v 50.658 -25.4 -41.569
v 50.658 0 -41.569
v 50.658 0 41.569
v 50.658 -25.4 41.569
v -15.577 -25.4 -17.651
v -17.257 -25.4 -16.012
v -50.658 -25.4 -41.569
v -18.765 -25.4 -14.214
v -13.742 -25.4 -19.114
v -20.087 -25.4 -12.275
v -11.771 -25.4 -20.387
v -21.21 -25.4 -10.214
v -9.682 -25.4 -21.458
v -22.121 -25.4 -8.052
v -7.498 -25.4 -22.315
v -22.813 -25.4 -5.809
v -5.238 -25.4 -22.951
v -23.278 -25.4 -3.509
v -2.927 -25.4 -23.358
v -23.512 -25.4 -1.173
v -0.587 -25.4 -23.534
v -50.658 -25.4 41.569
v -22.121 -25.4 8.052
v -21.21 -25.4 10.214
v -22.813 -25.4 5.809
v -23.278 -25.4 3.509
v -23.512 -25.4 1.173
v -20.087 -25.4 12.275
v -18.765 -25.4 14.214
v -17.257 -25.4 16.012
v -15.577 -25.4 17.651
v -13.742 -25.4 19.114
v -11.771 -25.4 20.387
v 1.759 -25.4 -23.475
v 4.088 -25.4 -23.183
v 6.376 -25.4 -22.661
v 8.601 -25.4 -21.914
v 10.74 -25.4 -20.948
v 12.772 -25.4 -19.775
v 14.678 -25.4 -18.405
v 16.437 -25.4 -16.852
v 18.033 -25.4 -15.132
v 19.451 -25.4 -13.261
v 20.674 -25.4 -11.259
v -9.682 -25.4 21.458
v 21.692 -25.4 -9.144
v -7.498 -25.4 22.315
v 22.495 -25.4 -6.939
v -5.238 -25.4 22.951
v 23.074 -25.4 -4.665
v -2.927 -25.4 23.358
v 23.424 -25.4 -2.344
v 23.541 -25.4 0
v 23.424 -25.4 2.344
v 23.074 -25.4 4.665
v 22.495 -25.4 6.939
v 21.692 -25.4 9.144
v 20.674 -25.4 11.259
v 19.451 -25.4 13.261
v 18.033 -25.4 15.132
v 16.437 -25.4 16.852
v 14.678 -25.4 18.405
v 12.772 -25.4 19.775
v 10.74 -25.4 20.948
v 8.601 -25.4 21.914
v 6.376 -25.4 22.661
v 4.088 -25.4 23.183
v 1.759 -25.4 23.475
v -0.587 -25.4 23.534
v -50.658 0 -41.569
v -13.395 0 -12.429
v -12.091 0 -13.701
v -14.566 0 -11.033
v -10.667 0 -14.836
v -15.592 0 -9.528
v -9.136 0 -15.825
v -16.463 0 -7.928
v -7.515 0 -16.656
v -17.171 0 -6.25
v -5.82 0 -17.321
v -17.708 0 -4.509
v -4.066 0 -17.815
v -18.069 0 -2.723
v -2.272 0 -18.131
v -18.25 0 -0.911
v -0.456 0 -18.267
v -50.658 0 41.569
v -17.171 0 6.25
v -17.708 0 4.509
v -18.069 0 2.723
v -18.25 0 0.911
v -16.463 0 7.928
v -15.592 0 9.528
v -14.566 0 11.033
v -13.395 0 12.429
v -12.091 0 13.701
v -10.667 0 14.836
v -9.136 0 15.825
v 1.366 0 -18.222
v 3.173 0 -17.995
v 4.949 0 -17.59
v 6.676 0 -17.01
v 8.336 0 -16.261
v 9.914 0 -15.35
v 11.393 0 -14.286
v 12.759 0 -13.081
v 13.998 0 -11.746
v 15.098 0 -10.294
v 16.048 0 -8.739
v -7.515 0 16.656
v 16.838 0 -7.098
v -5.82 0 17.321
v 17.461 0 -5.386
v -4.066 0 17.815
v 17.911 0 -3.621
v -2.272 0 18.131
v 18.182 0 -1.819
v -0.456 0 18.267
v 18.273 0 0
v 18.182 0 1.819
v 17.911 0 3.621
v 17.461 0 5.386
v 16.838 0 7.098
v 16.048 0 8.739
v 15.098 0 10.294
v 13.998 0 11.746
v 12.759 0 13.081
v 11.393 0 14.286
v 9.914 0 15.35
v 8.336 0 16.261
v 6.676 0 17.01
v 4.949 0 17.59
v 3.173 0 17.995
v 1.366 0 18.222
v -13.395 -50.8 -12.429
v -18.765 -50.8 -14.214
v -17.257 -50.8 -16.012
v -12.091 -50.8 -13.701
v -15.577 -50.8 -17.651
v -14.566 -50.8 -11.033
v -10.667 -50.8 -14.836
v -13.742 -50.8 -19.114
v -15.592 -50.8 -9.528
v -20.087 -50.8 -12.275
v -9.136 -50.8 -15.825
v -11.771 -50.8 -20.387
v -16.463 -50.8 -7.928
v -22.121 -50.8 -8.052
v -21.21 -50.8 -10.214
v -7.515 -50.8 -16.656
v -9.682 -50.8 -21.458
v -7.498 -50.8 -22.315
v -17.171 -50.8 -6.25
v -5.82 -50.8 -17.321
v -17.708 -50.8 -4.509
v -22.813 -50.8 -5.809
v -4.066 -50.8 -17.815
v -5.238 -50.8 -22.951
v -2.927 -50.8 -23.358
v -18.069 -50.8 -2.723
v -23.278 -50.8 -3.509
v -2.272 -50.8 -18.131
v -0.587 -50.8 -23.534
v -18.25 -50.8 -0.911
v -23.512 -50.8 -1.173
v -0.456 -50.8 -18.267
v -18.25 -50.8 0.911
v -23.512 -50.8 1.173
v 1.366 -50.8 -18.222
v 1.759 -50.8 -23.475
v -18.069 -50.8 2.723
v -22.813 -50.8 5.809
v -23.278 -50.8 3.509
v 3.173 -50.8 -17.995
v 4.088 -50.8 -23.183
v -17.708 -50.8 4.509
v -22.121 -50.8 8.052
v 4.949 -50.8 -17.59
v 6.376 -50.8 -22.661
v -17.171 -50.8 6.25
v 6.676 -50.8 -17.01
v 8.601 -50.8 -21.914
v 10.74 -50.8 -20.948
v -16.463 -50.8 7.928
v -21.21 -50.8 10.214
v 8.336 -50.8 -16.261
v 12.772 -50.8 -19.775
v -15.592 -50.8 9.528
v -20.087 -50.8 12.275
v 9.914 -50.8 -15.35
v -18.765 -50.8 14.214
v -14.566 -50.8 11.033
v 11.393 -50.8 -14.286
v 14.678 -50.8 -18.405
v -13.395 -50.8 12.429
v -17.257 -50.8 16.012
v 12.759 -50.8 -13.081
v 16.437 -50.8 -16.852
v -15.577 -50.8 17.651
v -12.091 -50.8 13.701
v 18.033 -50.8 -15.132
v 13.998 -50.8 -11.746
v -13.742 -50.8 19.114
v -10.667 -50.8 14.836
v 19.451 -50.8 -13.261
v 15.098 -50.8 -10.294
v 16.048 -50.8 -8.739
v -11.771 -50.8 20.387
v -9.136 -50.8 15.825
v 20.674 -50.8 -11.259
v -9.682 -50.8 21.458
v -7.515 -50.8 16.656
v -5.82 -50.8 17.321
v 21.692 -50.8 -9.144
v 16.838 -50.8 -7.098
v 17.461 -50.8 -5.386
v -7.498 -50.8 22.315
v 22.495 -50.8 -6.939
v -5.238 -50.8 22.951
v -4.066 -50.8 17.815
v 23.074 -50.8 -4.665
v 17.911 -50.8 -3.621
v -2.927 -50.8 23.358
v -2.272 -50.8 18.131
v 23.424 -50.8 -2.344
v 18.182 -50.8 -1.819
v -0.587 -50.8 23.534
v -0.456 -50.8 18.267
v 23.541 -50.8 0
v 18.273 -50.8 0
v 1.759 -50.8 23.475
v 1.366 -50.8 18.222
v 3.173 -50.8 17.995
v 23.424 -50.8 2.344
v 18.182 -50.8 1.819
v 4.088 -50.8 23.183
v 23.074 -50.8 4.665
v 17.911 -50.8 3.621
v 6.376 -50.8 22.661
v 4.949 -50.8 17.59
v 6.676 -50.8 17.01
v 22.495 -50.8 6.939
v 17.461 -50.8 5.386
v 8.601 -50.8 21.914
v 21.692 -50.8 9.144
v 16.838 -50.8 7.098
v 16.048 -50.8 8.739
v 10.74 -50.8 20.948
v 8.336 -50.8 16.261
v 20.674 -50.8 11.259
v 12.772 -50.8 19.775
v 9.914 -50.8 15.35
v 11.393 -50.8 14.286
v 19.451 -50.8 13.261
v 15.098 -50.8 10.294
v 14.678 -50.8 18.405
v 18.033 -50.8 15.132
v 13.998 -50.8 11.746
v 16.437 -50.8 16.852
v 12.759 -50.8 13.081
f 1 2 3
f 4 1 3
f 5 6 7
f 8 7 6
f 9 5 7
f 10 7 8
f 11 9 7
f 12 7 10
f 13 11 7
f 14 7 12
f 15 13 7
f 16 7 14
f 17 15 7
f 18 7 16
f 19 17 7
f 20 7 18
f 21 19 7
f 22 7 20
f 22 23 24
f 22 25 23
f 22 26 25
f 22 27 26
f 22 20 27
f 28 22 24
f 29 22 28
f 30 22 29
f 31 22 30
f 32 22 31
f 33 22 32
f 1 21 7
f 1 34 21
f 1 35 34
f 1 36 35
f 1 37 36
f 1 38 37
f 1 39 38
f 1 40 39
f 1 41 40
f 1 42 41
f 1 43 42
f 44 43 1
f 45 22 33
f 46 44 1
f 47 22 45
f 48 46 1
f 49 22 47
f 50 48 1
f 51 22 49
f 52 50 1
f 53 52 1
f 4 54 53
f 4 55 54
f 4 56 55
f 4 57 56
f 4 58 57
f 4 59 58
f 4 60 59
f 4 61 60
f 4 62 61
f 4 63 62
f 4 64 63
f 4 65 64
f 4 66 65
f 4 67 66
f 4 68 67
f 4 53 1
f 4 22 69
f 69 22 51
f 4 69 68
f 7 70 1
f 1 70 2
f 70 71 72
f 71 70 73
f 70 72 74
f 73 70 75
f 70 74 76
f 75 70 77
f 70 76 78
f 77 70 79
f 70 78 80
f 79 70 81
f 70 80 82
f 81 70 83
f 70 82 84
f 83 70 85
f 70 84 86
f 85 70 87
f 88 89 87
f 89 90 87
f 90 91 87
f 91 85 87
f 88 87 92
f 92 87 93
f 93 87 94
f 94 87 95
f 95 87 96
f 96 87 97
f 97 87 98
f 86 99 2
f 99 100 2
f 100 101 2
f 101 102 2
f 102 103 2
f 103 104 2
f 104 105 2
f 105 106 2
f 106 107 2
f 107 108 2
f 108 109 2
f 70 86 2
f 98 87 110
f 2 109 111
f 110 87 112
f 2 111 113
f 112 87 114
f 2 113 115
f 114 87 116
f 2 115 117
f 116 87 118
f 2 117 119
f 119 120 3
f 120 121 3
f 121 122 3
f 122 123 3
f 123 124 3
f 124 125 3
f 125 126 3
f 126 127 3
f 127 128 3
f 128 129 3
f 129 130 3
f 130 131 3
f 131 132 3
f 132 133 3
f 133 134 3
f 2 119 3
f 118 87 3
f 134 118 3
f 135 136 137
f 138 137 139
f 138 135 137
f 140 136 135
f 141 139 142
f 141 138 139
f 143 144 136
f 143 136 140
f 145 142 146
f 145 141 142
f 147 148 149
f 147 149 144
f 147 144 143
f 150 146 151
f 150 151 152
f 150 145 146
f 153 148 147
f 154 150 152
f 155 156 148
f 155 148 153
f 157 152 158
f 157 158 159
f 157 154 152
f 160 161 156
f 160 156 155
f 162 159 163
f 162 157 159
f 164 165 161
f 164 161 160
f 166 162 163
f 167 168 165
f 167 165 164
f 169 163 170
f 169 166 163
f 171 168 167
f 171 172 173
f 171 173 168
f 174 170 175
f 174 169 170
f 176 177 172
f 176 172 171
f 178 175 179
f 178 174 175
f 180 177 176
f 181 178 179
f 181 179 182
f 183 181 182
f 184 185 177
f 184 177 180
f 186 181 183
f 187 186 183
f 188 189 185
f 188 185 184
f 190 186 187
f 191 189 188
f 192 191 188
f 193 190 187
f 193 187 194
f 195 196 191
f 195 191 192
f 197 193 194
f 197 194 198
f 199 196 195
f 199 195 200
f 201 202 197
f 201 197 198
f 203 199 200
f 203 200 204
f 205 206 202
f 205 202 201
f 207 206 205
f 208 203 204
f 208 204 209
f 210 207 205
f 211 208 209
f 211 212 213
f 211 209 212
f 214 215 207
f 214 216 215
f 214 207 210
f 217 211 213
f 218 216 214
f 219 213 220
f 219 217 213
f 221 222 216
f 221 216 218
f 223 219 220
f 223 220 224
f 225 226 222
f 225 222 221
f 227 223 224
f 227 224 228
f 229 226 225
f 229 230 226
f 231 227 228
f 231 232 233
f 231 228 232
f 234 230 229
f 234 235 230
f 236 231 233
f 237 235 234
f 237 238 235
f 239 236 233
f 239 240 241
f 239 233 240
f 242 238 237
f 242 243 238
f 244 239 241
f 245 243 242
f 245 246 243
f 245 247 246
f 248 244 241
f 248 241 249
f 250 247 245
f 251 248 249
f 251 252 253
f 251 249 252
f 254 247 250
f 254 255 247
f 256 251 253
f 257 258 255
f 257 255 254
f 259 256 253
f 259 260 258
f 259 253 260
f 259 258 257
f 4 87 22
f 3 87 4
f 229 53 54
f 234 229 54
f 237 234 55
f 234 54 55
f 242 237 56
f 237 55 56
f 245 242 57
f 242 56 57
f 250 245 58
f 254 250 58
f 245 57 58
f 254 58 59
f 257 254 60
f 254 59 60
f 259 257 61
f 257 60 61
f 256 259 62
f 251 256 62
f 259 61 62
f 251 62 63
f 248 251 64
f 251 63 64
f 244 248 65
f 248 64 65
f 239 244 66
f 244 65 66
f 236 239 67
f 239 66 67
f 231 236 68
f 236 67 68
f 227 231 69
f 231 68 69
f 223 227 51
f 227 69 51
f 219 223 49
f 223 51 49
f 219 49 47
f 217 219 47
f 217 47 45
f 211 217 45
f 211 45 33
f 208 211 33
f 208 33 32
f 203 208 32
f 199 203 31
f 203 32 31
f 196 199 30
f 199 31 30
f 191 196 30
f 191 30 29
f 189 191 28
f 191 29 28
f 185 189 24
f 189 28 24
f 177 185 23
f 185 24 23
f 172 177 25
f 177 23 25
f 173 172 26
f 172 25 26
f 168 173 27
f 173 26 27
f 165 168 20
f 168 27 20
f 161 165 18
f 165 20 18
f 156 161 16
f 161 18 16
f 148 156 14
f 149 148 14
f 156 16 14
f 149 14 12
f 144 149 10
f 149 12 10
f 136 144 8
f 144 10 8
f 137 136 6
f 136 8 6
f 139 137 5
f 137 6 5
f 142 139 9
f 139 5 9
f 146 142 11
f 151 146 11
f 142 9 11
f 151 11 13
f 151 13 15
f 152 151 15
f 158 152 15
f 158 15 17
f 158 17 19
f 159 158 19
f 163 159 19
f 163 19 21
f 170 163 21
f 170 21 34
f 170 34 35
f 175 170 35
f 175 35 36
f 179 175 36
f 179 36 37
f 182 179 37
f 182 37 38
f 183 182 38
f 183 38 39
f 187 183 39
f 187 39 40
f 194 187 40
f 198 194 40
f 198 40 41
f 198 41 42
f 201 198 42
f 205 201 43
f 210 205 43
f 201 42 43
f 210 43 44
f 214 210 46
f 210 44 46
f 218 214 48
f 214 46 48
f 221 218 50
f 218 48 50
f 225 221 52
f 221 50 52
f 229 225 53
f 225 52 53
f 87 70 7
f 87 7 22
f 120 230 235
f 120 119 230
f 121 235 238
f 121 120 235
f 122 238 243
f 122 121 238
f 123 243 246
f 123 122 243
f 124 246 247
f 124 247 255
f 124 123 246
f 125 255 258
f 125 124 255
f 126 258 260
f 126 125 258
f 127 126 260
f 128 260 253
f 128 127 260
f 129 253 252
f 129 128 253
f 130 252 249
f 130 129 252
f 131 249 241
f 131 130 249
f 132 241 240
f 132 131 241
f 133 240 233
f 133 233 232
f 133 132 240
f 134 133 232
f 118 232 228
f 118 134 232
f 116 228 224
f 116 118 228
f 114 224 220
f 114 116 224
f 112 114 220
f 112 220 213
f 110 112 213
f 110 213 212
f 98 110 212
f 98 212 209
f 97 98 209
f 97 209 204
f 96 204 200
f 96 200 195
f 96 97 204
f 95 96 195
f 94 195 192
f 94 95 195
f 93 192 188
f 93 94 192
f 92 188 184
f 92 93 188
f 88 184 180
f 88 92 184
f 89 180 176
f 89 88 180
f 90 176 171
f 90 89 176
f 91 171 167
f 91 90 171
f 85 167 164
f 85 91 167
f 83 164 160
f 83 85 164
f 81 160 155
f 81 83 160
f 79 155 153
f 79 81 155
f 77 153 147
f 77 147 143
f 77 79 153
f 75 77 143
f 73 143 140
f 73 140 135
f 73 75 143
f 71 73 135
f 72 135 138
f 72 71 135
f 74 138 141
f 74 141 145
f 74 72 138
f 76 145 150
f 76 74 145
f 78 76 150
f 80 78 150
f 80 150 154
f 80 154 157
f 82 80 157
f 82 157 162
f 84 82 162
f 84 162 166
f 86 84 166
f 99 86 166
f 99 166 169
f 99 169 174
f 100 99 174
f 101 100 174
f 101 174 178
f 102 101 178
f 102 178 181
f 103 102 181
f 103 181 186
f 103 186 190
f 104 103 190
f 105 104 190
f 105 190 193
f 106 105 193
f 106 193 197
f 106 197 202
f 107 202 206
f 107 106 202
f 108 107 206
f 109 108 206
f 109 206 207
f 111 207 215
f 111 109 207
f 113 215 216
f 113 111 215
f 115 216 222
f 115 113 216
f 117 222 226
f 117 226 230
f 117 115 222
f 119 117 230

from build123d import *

# Parameters (mm, degrees)
F0_W     = 101.3161987066
F0_H     = 83.1388831139
F1_DEPTH = 25.4
F2_R     = 18.2729381932
F3_DEPTH = 25.4
F4_R     = 23.5410292958
F4_R_2   = 18.2729381932
F5_DEPTH = 25.4


with BuildPart() as f1:
    # F0 (on Front) → F1 (new body)
    with BuildSketch(Plane.XZ):
        Rectangle(F0_W, F0_H)
    extrude(amount=F1_DEPTH)

    # F2 (on face) → F3 (cut)
    with BuildSketch(Plane.XZ.offset(25.4)):
        Circle(F2_R)
    extrude(amount=-F3_DEPTH, mode=Mode.SUBTRACT)

    # F4 (on face) → F5 (join)
    with BuildSketch(Plane.XZ.offset(25.4)):
        Circle(F4_R)
        Circle(F4_R_2, mode=Mode.SUBTRACT)
    extrude(amount=F5_DEPTH)


solid = f1.part
